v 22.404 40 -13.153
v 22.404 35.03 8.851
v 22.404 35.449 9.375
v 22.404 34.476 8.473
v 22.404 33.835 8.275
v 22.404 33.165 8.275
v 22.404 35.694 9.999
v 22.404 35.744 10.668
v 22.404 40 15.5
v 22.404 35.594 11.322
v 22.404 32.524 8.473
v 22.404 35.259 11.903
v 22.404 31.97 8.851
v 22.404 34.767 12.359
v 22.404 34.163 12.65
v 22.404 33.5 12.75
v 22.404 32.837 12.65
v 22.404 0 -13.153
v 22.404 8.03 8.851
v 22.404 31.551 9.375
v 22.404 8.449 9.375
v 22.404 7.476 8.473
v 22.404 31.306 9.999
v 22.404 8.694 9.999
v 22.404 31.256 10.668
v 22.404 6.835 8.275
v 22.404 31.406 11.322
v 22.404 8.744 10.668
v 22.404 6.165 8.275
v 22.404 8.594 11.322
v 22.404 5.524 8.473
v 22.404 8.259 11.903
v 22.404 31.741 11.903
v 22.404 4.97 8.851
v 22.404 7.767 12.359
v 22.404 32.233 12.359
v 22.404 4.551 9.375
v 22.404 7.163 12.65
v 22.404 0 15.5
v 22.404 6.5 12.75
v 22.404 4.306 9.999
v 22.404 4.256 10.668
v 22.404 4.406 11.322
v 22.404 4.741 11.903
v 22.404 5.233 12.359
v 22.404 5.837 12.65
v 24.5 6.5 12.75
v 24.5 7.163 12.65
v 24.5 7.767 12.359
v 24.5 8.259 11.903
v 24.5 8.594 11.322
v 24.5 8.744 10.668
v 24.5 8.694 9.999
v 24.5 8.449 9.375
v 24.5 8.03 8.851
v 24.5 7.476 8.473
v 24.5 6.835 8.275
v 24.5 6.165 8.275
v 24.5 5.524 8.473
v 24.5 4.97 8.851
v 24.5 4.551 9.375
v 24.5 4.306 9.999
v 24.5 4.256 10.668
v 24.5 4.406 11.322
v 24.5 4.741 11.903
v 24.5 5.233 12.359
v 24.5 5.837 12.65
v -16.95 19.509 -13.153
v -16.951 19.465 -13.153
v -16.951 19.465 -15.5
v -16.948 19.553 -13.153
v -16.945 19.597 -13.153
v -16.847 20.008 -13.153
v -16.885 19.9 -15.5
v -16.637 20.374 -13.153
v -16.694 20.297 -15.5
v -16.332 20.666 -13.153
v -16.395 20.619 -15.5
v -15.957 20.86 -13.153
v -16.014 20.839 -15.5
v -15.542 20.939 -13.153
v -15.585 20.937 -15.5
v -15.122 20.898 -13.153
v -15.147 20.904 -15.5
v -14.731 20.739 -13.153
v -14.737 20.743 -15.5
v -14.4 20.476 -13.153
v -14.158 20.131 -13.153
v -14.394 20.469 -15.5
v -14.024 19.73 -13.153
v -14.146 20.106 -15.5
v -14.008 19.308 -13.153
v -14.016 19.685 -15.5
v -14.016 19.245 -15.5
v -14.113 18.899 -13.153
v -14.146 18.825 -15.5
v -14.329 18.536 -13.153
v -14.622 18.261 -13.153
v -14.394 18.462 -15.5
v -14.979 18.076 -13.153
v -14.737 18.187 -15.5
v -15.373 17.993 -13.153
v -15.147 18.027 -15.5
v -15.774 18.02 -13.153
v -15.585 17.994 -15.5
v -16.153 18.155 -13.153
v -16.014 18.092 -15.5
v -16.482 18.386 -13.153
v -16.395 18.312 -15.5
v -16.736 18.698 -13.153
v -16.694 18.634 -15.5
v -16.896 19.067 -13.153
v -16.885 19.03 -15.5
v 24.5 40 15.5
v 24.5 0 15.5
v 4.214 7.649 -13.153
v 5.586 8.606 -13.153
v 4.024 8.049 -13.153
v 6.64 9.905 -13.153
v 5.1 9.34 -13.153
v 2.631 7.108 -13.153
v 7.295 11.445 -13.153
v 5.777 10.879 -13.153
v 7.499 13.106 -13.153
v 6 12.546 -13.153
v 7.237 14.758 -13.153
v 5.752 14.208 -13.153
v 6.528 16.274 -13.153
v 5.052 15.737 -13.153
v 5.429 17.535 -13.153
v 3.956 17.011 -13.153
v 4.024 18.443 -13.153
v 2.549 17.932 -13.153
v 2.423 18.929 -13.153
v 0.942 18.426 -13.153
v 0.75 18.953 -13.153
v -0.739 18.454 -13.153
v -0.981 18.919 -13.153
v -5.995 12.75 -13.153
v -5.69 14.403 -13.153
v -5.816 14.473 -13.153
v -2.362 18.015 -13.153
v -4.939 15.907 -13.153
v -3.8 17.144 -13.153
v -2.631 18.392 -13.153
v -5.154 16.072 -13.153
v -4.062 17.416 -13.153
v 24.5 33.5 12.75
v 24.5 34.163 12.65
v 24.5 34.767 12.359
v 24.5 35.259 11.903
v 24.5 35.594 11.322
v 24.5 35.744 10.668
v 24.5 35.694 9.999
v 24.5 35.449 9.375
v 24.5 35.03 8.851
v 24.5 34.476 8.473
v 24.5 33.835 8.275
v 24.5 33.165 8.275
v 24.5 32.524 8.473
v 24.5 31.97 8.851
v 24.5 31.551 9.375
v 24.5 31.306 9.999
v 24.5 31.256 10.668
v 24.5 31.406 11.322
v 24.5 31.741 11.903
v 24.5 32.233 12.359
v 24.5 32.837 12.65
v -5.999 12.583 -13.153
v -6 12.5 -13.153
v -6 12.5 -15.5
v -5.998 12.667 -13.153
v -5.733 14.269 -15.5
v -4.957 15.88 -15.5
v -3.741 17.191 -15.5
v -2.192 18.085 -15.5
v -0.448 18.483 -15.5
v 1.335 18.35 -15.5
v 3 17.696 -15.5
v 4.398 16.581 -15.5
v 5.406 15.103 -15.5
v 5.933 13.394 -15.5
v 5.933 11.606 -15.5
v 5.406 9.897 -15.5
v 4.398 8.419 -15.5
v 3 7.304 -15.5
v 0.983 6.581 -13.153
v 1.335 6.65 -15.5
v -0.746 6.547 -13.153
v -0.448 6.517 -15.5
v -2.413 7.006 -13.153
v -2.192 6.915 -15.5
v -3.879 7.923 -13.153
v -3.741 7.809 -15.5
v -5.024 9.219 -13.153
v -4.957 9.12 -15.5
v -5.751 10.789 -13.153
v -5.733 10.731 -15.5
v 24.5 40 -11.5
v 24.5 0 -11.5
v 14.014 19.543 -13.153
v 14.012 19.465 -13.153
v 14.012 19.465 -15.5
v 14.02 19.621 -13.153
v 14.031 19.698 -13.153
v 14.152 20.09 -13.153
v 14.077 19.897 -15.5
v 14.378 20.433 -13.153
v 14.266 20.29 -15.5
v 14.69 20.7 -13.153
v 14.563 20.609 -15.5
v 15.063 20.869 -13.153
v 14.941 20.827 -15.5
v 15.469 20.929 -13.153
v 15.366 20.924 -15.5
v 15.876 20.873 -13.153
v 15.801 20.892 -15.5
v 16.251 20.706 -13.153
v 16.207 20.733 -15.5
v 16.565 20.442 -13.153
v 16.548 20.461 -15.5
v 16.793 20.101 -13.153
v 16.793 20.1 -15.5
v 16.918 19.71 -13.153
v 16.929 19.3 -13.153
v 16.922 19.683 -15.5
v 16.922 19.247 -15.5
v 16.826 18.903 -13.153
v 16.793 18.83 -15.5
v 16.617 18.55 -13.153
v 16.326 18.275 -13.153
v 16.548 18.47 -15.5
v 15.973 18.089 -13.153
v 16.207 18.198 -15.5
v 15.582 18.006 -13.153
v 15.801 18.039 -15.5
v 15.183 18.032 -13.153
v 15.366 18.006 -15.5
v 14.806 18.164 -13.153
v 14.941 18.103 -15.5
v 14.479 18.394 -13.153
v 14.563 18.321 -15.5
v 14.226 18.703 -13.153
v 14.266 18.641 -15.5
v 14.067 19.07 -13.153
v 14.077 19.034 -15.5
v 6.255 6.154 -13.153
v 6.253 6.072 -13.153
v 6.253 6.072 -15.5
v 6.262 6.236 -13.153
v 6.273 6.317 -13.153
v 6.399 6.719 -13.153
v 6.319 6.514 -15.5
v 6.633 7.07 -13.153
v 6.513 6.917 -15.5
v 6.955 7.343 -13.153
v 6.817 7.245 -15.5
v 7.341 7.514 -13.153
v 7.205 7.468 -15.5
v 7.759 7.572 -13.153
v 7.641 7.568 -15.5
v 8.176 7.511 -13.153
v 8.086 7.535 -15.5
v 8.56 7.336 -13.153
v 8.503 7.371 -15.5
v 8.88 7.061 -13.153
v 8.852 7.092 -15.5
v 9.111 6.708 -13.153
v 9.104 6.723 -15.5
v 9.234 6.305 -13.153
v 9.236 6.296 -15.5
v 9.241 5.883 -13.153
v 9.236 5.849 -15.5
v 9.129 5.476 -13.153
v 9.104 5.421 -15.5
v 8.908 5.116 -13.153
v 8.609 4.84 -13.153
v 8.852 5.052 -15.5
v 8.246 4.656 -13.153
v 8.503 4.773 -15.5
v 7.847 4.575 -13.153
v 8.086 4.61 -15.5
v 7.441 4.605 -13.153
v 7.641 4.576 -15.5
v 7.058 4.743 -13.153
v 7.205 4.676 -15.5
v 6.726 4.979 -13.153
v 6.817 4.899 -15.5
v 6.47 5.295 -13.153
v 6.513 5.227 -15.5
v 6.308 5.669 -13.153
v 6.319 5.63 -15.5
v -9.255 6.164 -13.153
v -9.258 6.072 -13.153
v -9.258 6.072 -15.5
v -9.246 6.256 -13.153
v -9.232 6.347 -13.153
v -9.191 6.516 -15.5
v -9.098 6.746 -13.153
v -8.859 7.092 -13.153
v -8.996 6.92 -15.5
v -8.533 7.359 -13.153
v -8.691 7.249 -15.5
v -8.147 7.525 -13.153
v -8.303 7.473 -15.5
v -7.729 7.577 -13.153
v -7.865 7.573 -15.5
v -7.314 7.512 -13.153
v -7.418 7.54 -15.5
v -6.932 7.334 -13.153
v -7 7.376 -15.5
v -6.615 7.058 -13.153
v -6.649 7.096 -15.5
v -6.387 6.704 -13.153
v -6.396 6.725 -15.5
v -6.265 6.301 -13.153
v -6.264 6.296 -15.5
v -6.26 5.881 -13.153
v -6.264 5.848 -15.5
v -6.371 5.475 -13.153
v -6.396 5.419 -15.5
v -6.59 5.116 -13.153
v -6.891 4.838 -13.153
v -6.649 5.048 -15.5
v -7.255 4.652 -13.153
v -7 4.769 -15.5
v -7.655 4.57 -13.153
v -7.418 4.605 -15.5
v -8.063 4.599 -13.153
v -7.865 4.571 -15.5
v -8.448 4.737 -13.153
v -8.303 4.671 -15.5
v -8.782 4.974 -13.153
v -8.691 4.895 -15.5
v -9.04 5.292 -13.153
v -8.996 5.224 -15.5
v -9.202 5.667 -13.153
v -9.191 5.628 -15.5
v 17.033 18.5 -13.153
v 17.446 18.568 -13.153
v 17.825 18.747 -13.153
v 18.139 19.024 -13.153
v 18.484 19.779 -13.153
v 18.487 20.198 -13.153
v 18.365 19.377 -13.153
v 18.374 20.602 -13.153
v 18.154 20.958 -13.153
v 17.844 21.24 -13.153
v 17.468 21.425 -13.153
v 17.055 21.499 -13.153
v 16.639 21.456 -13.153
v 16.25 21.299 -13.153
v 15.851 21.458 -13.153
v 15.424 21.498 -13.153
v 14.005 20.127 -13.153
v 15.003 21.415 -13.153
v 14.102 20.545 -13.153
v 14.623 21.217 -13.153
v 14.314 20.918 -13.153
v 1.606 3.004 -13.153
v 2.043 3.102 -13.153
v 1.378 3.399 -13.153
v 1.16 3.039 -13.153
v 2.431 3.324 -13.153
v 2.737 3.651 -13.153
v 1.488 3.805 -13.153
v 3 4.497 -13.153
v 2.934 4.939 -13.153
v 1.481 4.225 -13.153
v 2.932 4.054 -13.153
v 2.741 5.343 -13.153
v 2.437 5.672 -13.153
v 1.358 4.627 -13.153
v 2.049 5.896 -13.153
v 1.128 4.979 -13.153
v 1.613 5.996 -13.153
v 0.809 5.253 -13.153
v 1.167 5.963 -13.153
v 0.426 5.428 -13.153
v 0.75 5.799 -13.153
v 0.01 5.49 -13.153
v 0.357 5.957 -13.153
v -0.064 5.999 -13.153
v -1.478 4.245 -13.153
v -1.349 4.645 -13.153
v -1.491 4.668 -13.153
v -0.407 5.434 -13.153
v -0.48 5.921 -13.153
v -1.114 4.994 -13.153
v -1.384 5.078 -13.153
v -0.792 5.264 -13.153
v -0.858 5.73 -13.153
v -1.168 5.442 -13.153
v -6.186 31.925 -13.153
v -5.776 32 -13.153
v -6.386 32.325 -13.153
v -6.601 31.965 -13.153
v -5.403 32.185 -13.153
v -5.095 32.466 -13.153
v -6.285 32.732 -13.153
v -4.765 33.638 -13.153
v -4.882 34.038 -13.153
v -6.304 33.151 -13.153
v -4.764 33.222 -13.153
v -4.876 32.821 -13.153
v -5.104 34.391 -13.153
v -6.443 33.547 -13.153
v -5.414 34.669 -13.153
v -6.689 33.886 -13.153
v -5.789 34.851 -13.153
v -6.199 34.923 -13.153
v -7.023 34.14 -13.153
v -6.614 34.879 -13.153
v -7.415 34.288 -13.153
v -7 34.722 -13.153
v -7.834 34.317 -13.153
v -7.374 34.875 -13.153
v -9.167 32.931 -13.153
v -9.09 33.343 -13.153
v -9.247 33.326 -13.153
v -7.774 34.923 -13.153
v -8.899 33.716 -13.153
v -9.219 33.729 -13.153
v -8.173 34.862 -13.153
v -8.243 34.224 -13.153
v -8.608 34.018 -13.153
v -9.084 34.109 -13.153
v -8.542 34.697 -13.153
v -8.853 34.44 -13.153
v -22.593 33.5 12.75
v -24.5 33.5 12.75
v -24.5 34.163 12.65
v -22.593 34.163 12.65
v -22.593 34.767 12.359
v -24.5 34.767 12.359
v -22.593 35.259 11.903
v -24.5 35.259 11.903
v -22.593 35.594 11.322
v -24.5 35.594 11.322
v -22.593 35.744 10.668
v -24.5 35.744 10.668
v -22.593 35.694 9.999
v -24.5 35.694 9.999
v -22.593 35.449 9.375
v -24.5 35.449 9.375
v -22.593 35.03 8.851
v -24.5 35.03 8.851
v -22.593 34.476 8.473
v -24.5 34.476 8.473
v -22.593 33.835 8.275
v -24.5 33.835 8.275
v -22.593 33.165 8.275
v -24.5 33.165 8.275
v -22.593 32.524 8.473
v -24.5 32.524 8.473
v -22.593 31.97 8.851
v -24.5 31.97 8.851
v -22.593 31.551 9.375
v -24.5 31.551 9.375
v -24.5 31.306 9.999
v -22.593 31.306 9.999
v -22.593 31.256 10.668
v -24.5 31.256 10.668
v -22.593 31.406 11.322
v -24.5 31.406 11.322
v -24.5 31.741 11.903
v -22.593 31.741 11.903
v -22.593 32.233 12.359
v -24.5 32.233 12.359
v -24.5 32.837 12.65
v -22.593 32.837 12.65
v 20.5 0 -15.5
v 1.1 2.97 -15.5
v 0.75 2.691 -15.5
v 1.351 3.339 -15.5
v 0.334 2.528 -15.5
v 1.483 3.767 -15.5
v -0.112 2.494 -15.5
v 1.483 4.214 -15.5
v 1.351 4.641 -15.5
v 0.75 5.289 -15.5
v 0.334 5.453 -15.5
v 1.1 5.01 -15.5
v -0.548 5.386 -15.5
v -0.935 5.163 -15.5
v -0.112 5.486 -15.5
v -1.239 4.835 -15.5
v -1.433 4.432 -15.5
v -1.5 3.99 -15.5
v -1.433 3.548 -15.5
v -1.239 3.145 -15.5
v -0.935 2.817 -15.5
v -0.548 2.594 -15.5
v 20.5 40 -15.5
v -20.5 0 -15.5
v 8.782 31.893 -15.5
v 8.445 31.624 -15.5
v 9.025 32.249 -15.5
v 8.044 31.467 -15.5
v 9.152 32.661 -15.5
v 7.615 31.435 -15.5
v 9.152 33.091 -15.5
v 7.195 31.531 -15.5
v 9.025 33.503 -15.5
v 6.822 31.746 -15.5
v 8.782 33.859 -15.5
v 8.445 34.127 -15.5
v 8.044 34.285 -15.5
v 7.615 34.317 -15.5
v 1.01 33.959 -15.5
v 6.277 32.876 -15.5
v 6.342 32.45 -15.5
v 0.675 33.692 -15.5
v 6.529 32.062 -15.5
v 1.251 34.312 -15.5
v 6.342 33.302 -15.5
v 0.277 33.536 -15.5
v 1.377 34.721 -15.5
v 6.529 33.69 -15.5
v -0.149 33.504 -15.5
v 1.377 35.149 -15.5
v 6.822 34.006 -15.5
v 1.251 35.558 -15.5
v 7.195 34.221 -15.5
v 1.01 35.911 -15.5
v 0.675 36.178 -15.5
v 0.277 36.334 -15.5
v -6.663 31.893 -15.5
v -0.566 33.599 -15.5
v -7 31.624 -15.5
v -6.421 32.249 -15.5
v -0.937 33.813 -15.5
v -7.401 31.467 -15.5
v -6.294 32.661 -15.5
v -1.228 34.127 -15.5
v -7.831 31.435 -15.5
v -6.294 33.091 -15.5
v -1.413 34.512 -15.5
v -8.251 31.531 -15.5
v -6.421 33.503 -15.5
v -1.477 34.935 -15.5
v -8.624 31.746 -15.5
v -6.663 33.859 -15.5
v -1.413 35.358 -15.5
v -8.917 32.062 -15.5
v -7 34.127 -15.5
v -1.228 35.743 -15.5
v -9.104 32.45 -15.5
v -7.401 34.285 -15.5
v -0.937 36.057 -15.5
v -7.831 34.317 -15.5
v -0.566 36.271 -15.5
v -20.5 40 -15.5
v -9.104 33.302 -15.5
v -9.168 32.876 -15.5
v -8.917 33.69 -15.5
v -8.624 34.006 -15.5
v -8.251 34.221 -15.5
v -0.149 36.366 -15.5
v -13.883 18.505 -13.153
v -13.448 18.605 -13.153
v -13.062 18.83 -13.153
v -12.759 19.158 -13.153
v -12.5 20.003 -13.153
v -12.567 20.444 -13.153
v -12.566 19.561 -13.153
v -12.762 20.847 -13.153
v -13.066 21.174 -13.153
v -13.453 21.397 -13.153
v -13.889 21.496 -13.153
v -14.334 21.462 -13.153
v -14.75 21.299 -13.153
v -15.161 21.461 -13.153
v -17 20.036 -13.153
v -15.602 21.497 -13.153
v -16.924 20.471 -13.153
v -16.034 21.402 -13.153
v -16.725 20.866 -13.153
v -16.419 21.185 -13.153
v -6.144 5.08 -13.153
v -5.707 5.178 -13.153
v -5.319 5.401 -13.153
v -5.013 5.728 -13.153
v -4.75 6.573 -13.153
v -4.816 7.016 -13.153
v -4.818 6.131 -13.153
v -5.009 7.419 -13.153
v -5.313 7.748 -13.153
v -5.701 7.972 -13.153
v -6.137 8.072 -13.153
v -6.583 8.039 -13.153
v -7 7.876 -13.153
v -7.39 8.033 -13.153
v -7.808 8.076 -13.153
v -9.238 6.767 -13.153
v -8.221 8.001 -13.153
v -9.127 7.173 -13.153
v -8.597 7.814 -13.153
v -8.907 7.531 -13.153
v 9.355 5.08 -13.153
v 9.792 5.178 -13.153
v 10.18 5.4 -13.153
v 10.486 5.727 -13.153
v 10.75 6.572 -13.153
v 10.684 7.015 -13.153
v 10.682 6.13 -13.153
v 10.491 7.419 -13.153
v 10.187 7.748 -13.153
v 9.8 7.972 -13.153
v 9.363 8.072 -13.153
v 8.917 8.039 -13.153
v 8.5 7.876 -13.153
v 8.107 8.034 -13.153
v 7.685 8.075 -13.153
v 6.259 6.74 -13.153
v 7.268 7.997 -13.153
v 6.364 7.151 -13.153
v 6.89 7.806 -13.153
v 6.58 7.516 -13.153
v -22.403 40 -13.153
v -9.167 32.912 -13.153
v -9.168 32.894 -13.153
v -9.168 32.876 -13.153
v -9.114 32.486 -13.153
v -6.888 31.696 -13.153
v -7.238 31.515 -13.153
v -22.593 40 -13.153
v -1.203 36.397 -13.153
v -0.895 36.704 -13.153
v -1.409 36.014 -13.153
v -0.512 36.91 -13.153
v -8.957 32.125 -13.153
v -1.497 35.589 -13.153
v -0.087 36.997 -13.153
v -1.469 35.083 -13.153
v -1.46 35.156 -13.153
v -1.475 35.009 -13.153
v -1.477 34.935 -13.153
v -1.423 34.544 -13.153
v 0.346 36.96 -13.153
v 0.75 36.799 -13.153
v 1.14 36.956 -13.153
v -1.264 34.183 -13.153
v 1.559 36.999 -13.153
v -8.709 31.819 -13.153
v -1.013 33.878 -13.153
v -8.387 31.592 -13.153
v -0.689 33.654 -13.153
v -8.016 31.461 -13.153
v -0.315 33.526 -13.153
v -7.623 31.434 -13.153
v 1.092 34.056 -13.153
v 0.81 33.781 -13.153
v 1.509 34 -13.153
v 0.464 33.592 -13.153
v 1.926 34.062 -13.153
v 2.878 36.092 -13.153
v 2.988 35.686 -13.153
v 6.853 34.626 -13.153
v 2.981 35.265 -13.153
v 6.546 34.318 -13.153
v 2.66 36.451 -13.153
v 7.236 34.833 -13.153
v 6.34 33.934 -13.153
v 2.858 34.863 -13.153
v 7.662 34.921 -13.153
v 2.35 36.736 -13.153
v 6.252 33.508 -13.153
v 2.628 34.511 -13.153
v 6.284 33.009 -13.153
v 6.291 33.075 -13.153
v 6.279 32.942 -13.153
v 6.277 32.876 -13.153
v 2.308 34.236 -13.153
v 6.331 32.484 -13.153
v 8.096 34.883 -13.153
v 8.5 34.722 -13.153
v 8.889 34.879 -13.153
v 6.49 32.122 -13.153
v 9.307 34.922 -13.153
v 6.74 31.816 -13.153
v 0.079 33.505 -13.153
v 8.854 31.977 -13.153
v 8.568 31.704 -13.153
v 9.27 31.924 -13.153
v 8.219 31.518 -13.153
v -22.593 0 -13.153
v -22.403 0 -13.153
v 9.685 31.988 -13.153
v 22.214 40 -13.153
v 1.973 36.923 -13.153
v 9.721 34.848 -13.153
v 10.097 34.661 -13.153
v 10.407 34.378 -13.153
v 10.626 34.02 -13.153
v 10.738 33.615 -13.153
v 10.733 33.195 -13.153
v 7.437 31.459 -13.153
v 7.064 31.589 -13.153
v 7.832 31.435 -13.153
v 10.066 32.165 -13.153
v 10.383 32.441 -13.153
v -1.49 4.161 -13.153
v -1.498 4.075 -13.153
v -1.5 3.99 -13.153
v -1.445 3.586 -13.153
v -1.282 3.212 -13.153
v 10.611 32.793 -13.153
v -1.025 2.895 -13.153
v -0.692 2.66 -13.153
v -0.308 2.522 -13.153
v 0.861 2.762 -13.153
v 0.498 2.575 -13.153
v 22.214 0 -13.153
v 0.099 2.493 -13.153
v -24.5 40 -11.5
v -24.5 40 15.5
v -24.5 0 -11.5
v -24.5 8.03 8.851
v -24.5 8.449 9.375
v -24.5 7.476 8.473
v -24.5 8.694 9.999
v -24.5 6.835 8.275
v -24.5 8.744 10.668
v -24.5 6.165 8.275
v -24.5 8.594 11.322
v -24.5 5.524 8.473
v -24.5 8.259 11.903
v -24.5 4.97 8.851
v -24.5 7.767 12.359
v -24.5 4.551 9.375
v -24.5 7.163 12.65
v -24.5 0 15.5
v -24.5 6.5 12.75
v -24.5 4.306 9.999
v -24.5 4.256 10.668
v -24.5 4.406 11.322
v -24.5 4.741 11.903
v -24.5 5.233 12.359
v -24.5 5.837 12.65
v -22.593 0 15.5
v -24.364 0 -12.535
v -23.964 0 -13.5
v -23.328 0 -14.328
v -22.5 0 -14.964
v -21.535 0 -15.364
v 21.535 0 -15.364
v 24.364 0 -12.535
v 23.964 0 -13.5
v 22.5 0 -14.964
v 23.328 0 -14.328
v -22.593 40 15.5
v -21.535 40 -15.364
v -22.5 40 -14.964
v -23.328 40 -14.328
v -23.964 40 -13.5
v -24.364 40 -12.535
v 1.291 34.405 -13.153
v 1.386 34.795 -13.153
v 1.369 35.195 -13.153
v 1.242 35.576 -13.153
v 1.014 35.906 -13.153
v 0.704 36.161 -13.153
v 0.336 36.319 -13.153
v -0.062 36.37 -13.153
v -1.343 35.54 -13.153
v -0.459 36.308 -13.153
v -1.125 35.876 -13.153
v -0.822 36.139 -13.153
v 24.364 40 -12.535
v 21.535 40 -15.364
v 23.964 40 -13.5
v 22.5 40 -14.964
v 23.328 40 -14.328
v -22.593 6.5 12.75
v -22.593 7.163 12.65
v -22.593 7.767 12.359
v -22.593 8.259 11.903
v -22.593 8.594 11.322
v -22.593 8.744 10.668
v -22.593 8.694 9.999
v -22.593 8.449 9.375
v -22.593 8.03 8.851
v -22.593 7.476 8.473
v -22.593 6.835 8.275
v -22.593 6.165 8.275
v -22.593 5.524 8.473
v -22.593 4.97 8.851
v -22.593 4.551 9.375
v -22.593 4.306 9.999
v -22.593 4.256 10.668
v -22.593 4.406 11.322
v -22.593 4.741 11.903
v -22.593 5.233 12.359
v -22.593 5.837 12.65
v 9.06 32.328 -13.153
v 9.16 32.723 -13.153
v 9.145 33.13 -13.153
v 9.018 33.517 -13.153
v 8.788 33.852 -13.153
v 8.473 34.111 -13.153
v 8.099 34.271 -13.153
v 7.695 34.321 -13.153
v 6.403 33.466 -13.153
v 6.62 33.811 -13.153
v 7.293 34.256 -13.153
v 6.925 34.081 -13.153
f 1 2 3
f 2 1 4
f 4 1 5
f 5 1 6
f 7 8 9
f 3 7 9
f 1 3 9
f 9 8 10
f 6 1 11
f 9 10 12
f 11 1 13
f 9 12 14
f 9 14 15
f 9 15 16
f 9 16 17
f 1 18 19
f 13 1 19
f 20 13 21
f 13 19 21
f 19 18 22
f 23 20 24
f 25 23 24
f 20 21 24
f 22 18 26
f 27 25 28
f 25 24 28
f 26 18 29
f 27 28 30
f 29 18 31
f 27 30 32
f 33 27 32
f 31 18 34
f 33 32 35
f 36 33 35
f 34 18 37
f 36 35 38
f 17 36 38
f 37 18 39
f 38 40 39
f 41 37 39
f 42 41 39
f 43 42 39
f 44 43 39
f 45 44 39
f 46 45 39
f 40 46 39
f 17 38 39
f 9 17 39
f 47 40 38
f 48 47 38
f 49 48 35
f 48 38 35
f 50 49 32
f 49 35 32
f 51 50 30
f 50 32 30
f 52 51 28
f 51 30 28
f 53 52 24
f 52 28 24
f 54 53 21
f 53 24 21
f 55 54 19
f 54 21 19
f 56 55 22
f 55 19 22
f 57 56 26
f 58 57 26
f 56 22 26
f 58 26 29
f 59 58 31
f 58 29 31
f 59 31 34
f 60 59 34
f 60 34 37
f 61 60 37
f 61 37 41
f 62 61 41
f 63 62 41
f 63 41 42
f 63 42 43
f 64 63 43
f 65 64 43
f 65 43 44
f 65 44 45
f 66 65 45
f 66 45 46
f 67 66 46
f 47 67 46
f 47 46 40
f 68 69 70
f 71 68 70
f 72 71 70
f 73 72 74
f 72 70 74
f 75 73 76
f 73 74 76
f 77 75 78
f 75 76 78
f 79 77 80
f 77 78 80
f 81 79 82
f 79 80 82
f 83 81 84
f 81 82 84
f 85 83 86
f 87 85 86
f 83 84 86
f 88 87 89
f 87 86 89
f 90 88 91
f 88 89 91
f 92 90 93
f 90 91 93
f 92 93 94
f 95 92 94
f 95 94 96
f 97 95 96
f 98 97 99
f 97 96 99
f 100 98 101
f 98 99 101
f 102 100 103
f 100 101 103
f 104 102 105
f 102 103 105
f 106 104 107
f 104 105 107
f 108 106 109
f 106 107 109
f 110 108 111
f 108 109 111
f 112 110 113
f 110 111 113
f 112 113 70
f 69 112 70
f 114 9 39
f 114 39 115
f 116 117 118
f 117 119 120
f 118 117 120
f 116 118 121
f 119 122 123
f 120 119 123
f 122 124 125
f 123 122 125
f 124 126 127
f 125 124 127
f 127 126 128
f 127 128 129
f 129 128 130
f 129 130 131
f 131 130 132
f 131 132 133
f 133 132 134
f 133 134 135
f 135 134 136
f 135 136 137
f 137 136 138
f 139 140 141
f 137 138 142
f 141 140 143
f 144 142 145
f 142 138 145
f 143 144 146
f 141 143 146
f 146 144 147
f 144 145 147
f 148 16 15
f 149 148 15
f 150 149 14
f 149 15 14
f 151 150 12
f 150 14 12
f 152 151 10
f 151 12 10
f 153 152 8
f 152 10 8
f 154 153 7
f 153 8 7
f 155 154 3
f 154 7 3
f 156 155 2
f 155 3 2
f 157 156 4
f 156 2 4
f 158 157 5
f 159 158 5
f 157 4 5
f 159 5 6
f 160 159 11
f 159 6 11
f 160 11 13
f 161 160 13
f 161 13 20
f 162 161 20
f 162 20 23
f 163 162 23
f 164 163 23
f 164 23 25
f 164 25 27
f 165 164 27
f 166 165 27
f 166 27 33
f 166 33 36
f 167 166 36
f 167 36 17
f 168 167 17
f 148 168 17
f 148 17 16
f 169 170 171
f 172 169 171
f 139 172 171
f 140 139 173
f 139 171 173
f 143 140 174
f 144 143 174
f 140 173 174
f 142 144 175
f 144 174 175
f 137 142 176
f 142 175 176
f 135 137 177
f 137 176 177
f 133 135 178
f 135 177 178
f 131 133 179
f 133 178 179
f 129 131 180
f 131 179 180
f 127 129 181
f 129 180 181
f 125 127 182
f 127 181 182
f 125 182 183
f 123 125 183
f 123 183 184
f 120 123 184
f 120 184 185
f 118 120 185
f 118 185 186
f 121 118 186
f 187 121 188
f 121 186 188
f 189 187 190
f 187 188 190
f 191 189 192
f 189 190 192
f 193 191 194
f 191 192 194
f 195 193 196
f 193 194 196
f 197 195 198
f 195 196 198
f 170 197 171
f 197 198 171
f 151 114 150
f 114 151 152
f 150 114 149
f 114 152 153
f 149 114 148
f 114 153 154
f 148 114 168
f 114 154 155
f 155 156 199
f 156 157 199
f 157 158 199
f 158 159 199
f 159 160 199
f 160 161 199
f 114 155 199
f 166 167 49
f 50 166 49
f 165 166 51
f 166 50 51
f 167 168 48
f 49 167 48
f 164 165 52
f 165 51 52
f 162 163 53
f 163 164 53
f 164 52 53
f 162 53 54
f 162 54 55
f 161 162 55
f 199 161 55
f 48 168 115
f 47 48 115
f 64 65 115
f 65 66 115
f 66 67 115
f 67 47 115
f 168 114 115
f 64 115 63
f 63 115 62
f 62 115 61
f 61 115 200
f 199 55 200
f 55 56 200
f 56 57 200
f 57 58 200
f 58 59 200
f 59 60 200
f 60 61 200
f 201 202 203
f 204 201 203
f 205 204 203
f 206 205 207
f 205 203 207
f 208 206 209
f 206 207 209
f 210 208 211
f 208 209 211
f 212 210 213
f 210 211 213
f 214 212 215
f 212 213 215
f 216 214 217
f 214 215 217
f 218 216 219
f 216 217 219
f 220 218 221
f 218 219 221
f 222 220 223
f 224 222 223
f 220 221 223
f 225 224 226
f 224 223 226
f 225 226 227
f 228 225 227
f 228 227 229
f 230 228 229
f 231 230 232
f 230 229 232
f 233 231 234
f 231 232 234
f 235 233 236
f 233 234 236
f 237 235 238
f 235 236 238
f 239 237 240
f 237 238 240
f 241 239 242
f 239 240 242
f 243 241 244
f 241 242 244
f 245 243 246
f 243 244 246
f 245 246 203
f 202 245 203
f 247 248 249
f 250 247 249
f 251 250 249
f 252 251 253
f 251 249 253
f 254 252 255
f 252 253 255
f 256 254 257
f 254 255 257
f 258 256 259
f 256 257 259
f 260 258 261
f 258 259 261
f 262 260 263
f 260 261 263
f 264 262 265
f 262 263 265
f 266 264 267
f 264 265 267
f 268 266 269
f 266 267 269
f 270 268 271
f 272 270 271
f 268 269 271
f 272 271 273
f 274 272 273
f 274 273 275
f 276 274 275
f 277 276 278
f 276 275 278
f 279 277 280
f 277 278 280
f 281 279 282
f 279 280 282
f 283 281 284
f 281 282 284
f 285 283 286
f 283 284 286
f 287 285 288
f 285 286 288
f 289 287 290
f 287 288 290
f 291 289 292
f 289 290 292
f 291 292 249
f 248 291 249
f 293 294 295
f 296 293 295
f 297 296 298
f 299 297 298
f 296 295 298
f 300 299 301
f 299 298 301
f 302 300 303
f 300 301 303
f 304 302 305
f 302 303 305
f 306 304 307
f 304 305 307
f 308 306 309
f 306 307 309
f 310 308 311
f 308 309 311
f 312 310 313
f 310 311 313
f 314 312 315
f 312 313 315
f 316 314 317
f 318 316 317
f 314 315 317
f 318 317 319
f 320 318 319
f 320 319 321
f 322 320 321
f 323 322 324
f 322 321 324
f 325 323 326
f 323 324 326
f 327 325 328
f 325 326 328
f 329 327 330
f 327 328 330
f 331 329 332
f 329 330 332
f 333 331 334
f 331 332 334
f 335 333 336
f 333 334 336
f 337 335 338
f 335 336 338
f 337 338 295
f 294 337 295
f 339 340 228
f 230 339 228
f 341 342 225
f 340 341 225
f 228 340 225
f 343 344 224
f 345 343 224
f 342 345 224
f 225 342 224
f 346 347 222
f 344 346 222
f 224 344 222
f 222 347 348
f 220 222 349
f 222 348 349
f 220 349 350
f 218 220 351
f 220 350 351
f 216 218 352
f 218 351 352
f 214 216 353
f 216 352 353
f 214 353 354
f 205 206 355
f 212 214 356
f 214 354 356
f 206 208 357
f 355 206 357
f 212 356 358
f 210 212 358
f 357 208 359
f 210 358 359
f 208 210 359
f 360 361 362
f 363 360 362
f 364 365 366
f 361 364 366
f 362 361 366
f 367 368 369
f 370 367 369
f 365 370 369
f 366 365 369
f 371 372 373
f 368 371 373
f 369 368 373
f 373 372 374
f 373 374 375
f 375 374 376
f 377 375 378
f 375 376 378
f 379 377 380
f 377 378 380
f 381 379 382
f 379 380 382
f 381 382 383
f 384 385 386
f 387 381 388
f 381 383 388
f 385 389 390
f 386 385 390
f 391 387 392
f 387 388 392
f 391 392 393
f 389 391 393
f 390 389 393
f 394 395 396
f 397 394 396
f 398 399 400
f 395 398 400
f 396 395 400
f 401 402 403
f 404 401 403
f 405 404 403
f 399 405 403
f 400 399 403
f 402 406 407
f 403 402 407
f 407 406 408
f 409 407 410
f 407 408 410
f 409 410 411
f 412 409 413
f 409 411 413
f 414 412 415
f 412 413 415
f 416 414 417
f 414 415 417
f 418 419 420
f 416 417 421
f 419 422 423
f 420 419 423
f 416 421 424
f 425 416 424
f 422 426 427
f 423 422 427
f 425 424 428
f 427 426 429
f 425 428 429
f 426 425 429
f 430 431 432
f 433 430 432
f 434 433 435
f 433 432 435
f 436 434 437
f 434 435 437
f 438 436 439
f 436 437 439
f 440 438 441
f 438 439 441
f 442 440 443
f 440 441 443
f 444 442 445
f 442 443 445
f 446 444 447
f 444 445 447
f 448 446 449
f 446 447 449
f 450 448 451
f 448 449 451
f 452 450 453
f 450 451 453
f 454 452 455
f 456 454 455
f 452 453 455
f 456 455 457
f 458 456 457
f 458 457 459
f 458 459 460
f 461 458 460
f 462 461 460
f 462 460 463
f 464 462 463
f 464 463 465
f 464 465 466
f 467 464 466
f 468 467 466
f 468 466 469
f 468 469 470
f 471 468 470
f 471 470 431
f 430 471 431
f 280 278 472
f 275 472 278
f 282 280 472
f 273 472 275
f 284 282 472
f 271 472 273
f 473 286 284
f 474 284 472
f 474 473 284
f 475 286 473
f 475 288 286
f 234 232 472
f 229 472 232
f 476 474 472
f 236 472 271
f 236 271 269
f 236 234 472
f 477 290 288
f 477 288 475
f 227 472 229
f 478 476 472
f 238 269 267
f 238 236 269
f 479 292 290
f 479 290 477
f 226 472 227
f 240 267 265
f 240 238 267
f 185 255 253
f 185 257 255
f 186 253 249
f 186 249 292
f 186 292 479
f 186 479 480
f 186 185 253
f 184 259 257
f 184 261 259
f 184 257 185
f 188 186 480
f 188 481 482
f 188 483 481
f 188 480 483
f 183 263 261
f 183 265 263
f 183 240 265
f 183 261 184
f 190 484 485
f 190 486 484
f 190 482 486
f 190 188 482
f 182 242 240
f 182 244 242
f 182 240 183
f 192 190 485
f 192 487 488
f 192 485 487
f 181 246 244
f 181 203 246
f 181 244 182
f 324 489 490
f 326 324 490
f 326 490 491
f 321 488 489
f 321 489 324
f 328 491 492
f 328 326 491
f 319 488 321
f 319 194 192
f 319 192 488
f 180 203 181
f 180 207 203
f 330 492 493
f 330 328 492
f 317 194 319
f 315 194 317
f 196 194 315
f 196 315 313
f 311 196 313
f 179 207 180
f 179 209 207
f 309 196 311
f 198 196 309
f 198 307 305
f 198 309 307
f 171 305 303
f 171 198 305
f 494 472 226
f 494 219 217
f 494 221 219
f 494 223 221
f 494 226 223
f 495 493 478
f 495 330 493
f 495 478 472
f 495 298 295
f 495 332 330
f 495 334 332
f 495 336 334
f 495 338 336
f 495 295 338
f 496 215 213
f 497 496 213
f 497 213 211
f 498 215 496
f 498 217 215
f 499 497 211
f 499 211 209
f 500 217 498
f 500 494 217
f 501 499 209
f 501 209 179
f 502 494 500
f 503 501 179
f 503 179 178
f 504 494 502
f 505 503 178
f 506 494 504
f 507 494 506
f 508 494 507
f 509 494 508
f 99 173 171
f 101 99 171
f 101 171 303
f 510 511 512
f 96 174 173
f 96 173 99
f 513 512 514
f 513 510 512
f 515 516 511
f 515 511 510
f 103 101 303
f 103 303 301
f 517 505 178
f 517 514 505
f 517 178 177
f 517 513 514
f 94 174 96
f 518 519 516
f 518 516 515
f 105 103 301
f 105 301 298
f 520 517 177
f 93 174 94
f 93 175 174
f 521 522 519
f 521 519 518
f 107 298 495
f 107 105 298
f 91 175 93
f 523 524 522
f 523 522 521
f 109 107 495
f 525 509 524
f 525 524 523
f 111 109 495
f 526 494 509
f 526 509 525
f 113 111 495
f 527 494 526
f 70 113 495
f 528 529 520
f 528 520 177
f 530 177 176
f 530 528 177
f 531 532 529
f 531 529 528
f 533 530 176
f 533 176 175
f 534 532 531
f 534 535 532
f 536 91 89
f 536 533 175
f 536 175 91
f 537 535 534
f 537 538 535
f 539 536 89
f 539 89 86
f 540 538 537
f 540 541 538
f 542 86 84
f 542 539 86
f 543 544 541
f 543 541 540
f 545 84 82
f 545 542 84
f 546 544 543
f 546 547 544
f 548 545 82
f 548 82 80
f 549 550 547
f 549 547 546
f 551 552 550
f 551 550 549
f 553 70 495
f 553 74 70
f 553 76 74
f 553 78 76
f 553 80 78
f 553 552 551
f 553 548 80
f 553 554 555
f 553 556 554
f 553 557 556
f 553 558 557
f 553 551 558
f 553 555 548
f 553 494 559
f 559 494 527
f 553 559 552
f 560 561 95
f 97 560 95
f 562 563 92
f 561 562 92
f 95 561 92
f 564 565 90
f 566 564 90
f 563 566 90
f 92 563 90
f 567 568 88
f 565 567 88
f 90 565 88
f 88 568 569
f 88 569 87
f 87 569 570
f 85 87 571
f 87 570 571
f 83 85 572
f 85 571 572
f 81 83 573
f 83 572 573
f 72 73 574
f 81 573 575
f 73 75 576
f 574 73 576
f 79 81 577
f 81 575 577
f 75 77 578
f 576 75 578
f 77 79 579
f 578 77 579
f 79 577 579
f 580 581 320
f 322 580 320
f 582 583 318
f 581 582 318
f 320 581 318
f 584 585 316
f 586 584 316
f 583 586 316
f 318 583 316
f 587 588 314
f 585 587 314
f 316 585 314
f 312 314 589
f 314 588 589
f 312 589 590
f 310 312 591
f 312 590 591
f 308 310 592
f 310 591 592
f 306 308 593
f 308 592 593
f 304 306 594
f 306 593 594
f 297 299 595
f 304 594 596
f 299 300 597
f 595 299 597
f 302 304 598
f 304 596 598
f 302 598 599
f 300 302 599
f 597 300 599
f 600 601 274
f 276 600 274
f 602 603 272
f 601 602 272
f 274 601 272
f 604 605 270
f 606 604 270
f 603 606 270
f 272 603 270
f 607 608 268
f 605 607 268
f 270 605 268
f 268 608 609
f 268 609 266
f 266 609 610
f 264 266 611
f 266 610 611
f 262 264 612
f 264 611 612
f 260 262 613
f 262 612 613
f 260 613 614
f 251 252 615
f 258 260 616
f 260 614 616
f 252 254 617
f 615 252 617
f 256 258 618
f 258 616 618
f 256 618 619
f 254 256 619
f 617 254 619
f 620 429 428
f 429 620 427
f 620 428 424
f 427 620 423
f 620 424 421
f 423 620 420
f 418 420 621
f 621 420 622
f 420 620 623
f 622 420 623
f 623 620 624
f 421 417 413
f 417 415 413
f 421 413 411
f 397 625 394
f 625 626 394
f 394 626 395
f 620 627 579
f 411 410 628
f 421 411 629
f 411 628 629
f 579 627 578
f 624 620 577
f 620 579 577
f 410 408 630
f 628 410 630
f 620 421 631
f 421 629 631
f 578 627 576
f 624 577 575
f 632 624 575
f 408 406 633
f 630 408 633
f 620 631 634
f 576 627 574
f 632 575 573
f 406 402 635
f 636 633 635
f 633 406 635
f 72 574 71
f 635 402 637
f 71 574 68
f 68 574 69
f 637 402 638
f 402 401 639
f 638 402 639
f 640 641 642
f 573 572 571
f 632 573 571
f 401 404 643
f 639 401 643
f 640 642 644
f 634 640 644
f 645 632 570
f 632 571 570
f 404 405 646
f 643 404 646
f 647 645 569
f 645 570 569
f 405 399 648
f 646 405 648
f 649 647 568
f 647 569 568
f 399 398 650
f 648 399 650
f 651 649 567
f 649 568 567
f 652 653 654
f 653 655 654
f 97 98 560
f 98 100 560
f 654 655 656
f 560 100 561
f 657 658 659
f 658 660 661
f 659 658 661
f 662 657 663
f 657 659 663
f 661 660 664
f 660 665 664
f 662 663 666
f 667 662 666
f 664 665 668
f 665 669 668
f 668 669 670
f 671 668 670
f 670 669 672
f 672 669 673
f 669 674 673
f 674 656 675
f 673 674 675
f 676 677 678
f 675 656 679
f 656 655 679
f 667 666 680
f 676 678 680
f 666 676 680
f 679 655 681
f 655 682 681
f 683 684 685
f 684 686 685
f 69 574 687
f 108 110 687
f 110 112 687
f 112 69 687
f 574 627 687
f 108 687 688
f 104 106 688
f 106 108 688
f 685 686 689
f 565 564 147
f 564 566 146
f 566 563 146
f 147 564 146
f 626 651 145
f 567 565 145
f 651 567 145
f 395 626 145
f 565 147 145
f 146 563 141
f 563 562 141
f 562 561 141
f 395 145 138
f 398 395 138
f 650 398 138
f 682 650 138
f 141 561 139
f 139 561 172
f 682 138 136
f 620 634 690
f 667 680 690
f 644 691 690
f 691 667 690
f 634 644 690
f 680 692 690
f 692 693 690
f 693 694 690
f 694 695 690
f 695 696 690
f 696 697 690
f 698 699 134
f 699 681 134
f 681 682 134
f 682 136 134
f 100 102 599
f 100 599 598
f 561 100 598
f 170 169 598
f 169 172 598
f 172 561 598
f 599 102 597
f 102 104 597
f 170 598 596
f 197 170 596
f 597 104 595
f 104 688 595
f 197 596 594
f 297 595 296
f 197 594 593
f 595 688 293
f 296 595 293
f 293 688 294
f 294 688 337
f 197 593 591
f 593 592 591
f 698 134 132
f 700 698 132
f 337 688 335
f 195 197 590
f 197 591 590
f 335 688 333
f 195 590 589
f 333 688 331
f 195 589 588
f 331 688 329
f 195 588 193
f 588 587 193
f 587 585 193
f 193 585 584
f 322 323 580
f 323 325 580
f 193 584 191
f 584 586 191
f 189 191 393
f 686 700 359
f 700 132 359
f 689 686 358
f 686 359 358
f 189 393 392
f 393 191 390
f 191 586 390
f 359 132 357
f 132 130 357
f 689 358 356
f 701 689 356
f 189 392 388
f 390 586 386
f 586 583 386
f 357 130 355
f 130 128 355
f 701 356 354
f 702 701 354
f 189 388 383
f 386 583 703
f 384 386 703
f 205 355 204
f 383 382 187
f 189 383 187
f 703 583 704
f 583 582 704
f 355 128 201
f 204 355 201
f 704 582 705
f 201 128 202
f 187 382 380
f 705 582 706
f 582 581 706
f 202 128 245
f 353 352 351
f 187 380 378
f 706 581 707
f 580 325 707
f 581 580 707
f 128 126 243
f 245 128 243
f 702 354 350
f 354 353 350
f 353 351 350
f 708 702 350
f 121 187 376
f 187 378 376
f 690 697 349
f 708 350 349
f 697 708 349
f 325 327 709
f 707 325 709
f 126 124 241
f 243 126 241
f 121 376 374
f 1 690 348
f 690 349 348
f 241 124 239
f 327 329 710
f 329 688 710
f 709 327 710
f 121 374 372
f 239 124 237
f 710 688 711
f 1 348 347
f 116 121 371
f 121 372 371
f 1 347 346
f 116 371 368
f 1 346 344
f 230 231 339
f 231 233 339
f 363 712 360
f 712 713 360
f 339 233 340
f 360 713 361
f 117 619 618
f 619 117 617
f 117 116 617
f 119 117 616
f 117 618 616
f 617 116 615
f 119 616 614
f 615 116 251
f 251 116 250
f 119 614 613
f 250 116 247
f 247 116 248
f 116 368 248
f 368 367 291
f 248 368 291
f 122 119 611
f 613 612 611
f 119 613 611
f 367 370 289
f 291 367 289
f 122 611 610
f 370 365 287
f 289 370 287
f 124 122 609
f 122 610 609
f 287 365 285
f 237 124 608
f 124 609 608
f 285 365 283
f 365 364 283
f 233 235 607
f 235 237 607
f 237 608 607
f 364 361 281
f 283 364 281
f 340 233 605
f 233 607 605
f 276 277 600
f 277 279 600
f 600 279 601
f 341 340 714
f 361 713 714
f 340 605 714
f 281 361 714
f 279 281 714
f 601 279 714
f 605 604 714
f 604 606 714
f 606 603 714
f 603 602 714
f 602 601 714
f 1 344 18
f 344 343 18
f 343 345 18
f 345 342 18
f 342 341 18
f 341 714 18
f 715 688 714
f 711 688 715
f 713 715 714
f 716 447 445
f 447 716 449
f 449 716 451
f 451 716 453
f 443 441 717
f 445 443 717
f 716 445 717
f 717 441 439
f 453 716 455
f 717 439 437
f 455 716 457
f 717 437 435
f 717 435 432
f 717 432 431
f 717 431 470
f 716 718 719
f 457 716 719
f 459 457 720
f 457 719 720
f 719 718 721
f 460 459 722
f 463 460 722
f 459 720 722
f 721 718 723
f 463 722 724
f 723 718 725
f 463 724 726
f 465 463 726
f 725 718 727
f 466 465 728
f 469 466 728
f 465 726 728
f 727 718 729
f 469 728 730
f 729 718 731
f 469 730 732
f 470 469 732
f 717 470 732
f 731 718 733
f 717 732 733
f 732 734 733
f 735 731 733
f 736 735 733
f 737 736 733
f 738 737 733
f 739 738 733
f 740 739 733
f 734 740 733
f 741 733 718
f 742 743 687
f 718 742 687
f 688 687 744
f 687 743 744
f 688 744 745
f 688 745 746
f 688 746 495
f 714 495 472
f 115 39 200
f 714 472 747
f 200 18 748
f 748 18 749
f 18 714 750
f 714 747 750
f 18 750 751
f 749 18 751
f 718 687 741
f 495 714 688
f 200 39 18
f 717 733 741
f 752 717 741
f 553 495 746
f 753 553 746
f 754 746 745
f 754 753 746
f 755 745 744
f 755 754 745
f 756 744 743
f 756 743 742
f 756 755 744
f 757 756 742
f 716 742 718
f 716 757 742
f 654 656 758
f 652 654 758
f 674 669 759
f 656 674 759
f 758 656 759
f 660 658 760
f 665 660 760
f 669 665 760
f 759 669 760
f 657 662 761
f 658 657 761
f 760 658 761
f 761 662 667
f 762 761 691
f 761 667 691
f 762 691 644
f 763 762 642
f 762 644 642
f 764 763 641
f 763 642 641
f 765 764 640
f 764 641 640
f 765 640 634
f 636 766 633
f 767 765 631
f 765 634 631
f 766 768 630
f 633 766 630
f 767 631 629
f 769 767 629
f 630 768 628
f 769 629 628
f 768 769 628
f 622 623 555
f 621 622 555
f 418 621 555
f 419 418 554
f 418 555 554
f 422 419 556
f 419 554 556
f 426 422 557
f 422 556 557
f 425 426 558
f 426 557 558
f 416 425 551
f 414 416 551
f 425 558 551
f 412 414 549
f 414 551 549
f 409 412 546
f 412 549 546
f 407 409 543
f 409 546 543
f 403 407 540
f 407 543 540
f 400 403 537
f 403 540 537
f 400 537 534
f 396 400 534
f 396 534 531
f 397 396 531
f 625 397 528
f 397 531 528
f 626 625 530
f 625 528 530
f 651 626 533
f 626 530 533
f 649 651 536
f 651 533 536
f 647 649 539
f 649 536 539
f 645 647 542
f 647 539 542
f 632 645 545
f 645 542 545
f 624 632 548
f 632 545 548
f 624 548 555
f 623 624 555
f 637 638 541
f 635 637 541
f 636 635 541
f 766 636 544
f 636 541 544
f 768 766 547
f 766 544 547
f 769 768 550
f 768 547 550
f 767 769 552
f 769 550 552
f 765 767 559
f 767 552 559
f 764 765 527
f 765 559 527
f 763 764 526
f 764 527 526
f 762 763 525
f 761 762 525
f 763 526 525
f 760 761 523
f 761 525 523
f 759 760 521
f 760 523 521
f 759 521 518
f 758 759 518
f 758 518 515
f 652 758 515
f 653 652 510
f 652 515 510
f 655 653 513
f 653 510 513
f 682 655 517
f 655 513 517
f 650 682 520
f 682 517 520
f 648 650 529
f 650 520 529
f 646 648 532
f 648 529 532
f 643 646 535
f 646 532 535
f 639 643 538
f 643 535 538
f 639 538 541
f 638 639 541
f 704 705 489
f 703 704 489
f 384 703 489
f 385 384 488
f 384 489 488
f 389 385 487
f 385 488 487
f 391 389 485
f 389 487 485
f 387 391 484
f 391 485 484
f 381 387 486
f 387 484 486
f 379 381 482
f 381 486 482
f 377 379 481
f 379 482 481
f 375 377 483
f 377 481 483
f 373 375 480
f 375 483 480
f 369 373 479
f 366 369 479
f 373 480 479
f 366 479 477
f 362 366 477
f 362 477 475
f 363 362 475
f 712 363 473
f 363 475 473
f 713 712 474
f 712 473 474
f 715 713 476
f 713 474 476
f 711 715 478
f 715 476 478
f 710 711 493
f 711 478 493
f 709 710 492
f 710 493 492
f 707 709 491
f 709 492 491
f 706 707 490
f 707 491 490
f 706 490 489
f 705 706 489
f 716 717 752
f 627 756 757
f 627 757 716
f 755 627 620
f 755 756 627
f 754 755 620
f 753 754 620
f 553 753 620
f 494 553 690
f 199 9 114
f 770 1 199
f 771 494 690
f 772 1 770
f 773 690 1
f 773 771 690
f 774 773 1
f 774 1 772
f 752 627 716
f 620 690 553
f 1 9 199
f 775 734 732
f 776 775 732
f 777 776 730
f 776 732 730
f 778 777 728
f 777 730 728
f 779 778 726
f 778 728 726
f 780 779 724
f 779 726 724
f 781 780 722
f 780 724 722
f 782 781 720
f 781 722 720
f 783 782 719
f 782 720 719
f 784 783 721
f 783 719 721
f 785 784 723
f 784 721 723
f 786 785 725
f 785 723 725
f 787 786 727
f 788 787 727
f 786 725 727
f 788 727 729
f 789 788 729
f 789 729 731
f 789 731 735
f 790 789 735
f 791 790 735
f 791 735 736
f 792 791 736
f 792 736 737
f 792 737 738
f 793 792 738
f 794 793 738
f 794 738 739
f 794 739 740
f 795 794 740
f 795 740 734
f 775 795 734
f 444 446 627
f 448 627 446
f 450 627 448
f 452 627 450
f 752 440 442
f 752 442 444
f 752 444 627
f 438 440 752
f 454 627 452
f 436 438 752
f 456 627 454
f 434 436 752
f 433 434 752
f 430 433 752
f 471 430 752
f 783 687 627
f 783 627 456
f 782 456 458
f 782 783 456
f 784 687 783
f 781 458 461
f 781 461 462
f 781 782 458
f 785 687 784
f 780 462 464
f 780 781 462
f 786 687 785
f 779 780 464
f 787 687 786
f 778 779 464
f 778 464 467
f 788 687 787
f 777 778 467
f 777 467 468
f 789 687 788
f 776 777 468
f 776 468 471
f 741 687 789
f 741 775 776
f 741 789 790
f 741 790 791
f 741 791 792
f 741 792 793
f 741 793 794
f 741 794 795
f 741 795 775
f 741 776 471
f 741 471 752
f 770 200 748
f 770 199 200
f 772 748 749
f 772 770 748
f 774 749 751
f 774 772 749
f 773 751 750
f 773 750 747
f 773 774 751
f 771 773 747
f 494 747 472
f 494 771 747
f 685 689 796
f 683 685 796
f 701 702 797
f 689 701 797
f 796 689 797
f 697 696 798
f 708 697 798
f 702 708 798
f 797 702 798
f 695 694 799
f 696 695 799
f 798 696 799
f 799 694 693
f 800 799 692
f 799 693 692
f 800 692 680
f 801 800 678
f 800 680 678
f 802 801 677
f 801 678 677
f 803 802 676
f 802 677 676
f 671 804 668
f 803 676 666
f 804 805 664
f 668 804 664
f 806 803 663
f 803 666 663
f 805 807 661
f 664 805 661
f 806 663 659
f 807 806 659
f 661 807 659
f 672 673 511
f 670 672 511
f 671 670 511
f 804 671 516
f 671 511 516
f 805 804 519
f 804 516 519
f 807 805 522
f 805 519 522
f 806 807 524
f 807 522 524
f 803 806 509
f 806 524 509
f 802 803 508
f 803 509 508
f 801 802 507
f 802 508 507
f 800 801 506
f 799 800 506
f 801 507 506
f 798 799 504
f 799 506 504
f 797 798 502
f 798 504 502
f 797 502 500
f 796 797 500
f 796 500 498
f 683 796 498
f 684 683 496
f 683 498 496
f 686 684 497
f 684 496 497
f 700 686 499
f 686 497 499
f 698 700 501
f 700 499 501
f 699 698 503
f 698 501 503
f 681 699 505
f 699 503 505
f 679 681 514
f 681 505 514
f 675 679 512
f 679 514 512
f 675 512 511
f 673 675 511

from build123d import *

# Parameters (mm, degrees)
BOSS_EXTRUDE1_DEPTH = 40
FILLET1_R           = 4
SKETCH2_R           = 1.5
SKETCH2_R_2         = 6
CUT_EXTRUDE1_DEPTH  = 40
SKETCH3_R           = 2.25
CUT_EXTRUDE2_DEPTH  = 76
SKETCH4_R           = 1.5
SKETCH4_R_2         = 6
BOSS_EXTRUDE2_DEPTH = 2.346753
SKETCH5_R           = 1.5
SKETCH5_R_2         = 6
CUT_EXTRUDE3_DEPTH  = 10
SKETCH7_W           = 0.19
SKETCH7_H           = 28.653247295
CUT_EXTRUDE4_DEPTH  = 463
SKETCH11_R          = 6
BOSS_EXTRUDE3_DEPTH = 2.346753
SKETCH12_R          = 6
CUT_EXTRUDE7_DEPTH  = 10
SKETCH13_R          = 1.5
BOSS_EXTRUDE4_DEPTH = 2.346753
SKETCH14_R          = 1.475604419
SKETCH14_R_2        = 1.463203764
SKETCH14_R_3        = 1.5
SKETCH14_R_4        = 1.434937512
SKETCH14_R_5        = 1.505191791
SKETCH14_R_6        = 1.44518411
CUT_EXTRUDE8_DEPTH  = 10


with BuildPart() as part:
    # Sketch1 → Boss-Extrude1 (new body)
    with BuildSketch(Plane(origin=(0, 0, 0), x_dir=(1, 0, 0), z_dir=(0, 1, 0))):
        Polygon((-22.403304398, -15.5), (-22.403304398, 13.153247295), (22.214170378, 13.153247295), (22.214170378, -15.5), (24.5, -15.5), (24.5, 15.5), (-24.5, 15.5), (-24.5, -15.5), align=None)
    extrude(amount=BOSS_EXTRUDE1_DEPTH)

    # Fillet1
    fillet1_edges = [part.edges().sort_by_distance(p)[0] for p in [
        (-24.5, 20, -15.5),
        (24.5, 20, -15.5),
    ]]
    fillet(fillet1_edges, radius=FILLET1_R)

    # Sketch2 → Cut-Extrude1 (cut)
    with BuildSketch(Plane(origin=(0, 0, -15.5), x_dir=(-1, 0, 0), z_dir=(0, 0, -1))):
        with Locations((14, 20)):
            Circle(SKETCH2_R)
        with Locations((-17, 20)):
            Circle(SKETCH2_R)
        with Locations((-1.5, 4.5)):
            Circle(SKETCH2_R)
        with Locations((-1.5, 35.5)):
            Circle(SKETCH2_R)
        with Locations((-9.25, 6.576606241)):
            Circle(SKETCH2_R)
        with Locations((-9.25, 33.423393759)):
            Circle(SKETCH2_R)
        with Locations((6.25, 33.423393759)):
            Circle(SKETCH2_R)
        with Locations((6.25, 6.576606241)):
            Circle(SKETCH2_R)
        with Locations((-1.5, 13)):
            Circle(SKETCH2_R_2)
    extrude(amount=-CUT_EXTRUDE1_DEPTH, mode=Mode.SUBTRACT)

    # Sketch3 → Cut-Extrude2 (cut)
    with BuildSketch(Plane.ZY.offset(24.5)):
        with Locations((10.5, 6.5)):
            Circle(SKETCH3_R)
        with Locations((10.5, 33.5)):
            Circle(SKETCH3_R)
    extrude(amount=-CUT_EXTRUDE2_DEPTH, mode=Mode.SUBTRACT)

    # Sketch4 → Boss-Extrude2 (add)
    with BuildSketch(Plane(origin=(0, 0, -15.5), x_dir=(-1, 0, 0), z_dir=(0, 0, -1))):
        with Locations((6.25, 33.423393759)):
            Circle(SKETCH4_R)
        with Locations((14, 20)):
            Circle(SKETCH4_R)
        with Locations((6.25, 6.576606241)):
            Circle(SKETCH4_R)
        with Locations((-1.5, 4.5)):
            Circle(SKETCH4_R)
        with Locations((-9.25, 6.576606241)):
            Circle(SKETCH4_R)
        with Locations((-17, 20)):
            Circle(SKETCH4_R)
        with Locations((-1.5, 35.5)):
            Circle(SKETCH4_R)
        with Locations((-9.25, 33.423393759)):
            Circle(SKETCH4_R)
        with Locations((-1.5, 13)):
            Circle(SKETCH4_R_2)
    extrude(amount=-BOSS_EXTRUDE2_DEPTH)

    # Sketch5 → Cut-Extrude3 (cut)
    with BuildSketch(Plane(origin=(0, 0, -15.5), x_dir=(-1, 0, 0), z_dir=(0, 0, -1))):
        with Locations((15.5, 20)):
            Circle(SKETCH5_R)
        with Locations((0, 4.5)):
            Circle(SKETCH5_R)
        with Locations((-15.5, 20)):
            Circle(SKETCH5_R)
        with Locations((0, 35.5)):
            Circle(SKETCH5_R)
        with Locations((7.75, 33.423393759)):
            Circle(SKETCH5_R)
        with Locations((-7.75, 33.423393759)):
            Circle(SKETCH5_R)
        with Locations((-7.75, 6.576606241)):
            Circle(SKETCH5_R)
        with Locations((7.75, 6.576606241)):
            Circle(SKETCH5_R)
        with Locations((0, 13)):
            Circle(SKETCH5_R_2)
    extrude(amount=-CUT_EXTRUDE3_DEPTH, mode=Mode.SUBTRACT)

    # Sketch7 → Cut-Extrude4 (cut)
    with BuildSketch(Plane.XZ):
        with Locations((-22.498304398, 1.173376353)):
            Rectangle(SKETCH7_W, SKETCH7_H)
        with Locations((22.309170378, 1.173376353)):
            Rectangle(SKETCH7_W, SKETCH7_H)
    extrude(amount=-CUT_EXTRUDE4_DEPTH, mode=Mode.SUBTRACT)

    # Sketch11 → Boss-Extrude3 (add)
    with BuildSketch(Plane(origin=(0, 0, -15.5), x_dir=(-1, 0, 0), z_dir=(0, 0, -1))):
        with Locations((0, 13)):
            Circle(SKETCH11_R)
    extrude(amount=-BOSS_EXTRUDE3_DEPTH)

    # Sketch12 → Cut-Extrude7 (cut)
    with BuildSketch(Plane(origin=(0, 0, -15.5), x_dir=(-1, 0, 0), z_dir=(0, 0, -1))):
        with Locations((0, 12.5)):
            Circle(SKETCH12_R)
    extrude(amount=-CUT_EXTRUDE7_DEPTH, mode=Mode.SUBTRACT)

    # Sketch13 → Boss-Extrude4 (add)
    with BuildSketch(Plane(origin=(0, 0, -15.5), x_dir=(-1, 0, 0), z_dir=(0, 0, -1))):
        with Locations((7.75, 6.576606241)):
            Circle(SKETCH13_R)
        with Locations((0, 4.5)):
            Circle(SKETCH13_R)
        with Locations((-7.75, 6.576606241)):
            Circle(SKETCH13_R)
        with Locations((-15.5, 20)):
            Circle(SKETCH13_R)
        with Locations((-7.75, 33.423393759)):
            Circle(SKETCH13_R)
        with Locations((0, 35.5)):
            Circle(SKETCH13_R)
        with Locations((7.75, 33.423393759)):
            Circle(SKETCH13_R)
        with Locations((15.5, 20)):
            Circle(SKETCH13_R)
    extrude(amount=-BOSS_EXTRUDE4_DEPTH)

    # Sketch14 → Cut-Extrude8 (cut)
    with BuildSketch(Plane(origin=(0, 0, -15.5), x_dir=(-1, 0, 0), z_dir=(0, 0, -1))):
        with Locations((15.475197646, 19.465354549)):
            Circle(SKETCH14_R)
        with Locations((-15.475197646, 19.465354549)):
            Circle(SKETCH14_R_2)
        with Locations((0, 3.990156903)):
            Circle(SKETCH14_R_3)
        with Locations((0.042141816, 34.934937512)):
            Circle(SKETCH14_R_4)
        with Locations((7.752595896, 6.072110018)):
            Circle(SKETCH14_R_5)
        with Locations((-7.752600927, 6.072112931)):
            Circle(SKETCH14_R_3)
        with Locations((-7.722592055, 32.875921806)):
            Circle(SKETCH14_R_6)
        with Locations((7.722592055, 32.875921806)):
            Circle(SKETCH14_R_6)
    extrude(amount=-CUT_EXTRUDE8_DEPTH, mode=Mode.SUBTRACT)


solid = part.part
